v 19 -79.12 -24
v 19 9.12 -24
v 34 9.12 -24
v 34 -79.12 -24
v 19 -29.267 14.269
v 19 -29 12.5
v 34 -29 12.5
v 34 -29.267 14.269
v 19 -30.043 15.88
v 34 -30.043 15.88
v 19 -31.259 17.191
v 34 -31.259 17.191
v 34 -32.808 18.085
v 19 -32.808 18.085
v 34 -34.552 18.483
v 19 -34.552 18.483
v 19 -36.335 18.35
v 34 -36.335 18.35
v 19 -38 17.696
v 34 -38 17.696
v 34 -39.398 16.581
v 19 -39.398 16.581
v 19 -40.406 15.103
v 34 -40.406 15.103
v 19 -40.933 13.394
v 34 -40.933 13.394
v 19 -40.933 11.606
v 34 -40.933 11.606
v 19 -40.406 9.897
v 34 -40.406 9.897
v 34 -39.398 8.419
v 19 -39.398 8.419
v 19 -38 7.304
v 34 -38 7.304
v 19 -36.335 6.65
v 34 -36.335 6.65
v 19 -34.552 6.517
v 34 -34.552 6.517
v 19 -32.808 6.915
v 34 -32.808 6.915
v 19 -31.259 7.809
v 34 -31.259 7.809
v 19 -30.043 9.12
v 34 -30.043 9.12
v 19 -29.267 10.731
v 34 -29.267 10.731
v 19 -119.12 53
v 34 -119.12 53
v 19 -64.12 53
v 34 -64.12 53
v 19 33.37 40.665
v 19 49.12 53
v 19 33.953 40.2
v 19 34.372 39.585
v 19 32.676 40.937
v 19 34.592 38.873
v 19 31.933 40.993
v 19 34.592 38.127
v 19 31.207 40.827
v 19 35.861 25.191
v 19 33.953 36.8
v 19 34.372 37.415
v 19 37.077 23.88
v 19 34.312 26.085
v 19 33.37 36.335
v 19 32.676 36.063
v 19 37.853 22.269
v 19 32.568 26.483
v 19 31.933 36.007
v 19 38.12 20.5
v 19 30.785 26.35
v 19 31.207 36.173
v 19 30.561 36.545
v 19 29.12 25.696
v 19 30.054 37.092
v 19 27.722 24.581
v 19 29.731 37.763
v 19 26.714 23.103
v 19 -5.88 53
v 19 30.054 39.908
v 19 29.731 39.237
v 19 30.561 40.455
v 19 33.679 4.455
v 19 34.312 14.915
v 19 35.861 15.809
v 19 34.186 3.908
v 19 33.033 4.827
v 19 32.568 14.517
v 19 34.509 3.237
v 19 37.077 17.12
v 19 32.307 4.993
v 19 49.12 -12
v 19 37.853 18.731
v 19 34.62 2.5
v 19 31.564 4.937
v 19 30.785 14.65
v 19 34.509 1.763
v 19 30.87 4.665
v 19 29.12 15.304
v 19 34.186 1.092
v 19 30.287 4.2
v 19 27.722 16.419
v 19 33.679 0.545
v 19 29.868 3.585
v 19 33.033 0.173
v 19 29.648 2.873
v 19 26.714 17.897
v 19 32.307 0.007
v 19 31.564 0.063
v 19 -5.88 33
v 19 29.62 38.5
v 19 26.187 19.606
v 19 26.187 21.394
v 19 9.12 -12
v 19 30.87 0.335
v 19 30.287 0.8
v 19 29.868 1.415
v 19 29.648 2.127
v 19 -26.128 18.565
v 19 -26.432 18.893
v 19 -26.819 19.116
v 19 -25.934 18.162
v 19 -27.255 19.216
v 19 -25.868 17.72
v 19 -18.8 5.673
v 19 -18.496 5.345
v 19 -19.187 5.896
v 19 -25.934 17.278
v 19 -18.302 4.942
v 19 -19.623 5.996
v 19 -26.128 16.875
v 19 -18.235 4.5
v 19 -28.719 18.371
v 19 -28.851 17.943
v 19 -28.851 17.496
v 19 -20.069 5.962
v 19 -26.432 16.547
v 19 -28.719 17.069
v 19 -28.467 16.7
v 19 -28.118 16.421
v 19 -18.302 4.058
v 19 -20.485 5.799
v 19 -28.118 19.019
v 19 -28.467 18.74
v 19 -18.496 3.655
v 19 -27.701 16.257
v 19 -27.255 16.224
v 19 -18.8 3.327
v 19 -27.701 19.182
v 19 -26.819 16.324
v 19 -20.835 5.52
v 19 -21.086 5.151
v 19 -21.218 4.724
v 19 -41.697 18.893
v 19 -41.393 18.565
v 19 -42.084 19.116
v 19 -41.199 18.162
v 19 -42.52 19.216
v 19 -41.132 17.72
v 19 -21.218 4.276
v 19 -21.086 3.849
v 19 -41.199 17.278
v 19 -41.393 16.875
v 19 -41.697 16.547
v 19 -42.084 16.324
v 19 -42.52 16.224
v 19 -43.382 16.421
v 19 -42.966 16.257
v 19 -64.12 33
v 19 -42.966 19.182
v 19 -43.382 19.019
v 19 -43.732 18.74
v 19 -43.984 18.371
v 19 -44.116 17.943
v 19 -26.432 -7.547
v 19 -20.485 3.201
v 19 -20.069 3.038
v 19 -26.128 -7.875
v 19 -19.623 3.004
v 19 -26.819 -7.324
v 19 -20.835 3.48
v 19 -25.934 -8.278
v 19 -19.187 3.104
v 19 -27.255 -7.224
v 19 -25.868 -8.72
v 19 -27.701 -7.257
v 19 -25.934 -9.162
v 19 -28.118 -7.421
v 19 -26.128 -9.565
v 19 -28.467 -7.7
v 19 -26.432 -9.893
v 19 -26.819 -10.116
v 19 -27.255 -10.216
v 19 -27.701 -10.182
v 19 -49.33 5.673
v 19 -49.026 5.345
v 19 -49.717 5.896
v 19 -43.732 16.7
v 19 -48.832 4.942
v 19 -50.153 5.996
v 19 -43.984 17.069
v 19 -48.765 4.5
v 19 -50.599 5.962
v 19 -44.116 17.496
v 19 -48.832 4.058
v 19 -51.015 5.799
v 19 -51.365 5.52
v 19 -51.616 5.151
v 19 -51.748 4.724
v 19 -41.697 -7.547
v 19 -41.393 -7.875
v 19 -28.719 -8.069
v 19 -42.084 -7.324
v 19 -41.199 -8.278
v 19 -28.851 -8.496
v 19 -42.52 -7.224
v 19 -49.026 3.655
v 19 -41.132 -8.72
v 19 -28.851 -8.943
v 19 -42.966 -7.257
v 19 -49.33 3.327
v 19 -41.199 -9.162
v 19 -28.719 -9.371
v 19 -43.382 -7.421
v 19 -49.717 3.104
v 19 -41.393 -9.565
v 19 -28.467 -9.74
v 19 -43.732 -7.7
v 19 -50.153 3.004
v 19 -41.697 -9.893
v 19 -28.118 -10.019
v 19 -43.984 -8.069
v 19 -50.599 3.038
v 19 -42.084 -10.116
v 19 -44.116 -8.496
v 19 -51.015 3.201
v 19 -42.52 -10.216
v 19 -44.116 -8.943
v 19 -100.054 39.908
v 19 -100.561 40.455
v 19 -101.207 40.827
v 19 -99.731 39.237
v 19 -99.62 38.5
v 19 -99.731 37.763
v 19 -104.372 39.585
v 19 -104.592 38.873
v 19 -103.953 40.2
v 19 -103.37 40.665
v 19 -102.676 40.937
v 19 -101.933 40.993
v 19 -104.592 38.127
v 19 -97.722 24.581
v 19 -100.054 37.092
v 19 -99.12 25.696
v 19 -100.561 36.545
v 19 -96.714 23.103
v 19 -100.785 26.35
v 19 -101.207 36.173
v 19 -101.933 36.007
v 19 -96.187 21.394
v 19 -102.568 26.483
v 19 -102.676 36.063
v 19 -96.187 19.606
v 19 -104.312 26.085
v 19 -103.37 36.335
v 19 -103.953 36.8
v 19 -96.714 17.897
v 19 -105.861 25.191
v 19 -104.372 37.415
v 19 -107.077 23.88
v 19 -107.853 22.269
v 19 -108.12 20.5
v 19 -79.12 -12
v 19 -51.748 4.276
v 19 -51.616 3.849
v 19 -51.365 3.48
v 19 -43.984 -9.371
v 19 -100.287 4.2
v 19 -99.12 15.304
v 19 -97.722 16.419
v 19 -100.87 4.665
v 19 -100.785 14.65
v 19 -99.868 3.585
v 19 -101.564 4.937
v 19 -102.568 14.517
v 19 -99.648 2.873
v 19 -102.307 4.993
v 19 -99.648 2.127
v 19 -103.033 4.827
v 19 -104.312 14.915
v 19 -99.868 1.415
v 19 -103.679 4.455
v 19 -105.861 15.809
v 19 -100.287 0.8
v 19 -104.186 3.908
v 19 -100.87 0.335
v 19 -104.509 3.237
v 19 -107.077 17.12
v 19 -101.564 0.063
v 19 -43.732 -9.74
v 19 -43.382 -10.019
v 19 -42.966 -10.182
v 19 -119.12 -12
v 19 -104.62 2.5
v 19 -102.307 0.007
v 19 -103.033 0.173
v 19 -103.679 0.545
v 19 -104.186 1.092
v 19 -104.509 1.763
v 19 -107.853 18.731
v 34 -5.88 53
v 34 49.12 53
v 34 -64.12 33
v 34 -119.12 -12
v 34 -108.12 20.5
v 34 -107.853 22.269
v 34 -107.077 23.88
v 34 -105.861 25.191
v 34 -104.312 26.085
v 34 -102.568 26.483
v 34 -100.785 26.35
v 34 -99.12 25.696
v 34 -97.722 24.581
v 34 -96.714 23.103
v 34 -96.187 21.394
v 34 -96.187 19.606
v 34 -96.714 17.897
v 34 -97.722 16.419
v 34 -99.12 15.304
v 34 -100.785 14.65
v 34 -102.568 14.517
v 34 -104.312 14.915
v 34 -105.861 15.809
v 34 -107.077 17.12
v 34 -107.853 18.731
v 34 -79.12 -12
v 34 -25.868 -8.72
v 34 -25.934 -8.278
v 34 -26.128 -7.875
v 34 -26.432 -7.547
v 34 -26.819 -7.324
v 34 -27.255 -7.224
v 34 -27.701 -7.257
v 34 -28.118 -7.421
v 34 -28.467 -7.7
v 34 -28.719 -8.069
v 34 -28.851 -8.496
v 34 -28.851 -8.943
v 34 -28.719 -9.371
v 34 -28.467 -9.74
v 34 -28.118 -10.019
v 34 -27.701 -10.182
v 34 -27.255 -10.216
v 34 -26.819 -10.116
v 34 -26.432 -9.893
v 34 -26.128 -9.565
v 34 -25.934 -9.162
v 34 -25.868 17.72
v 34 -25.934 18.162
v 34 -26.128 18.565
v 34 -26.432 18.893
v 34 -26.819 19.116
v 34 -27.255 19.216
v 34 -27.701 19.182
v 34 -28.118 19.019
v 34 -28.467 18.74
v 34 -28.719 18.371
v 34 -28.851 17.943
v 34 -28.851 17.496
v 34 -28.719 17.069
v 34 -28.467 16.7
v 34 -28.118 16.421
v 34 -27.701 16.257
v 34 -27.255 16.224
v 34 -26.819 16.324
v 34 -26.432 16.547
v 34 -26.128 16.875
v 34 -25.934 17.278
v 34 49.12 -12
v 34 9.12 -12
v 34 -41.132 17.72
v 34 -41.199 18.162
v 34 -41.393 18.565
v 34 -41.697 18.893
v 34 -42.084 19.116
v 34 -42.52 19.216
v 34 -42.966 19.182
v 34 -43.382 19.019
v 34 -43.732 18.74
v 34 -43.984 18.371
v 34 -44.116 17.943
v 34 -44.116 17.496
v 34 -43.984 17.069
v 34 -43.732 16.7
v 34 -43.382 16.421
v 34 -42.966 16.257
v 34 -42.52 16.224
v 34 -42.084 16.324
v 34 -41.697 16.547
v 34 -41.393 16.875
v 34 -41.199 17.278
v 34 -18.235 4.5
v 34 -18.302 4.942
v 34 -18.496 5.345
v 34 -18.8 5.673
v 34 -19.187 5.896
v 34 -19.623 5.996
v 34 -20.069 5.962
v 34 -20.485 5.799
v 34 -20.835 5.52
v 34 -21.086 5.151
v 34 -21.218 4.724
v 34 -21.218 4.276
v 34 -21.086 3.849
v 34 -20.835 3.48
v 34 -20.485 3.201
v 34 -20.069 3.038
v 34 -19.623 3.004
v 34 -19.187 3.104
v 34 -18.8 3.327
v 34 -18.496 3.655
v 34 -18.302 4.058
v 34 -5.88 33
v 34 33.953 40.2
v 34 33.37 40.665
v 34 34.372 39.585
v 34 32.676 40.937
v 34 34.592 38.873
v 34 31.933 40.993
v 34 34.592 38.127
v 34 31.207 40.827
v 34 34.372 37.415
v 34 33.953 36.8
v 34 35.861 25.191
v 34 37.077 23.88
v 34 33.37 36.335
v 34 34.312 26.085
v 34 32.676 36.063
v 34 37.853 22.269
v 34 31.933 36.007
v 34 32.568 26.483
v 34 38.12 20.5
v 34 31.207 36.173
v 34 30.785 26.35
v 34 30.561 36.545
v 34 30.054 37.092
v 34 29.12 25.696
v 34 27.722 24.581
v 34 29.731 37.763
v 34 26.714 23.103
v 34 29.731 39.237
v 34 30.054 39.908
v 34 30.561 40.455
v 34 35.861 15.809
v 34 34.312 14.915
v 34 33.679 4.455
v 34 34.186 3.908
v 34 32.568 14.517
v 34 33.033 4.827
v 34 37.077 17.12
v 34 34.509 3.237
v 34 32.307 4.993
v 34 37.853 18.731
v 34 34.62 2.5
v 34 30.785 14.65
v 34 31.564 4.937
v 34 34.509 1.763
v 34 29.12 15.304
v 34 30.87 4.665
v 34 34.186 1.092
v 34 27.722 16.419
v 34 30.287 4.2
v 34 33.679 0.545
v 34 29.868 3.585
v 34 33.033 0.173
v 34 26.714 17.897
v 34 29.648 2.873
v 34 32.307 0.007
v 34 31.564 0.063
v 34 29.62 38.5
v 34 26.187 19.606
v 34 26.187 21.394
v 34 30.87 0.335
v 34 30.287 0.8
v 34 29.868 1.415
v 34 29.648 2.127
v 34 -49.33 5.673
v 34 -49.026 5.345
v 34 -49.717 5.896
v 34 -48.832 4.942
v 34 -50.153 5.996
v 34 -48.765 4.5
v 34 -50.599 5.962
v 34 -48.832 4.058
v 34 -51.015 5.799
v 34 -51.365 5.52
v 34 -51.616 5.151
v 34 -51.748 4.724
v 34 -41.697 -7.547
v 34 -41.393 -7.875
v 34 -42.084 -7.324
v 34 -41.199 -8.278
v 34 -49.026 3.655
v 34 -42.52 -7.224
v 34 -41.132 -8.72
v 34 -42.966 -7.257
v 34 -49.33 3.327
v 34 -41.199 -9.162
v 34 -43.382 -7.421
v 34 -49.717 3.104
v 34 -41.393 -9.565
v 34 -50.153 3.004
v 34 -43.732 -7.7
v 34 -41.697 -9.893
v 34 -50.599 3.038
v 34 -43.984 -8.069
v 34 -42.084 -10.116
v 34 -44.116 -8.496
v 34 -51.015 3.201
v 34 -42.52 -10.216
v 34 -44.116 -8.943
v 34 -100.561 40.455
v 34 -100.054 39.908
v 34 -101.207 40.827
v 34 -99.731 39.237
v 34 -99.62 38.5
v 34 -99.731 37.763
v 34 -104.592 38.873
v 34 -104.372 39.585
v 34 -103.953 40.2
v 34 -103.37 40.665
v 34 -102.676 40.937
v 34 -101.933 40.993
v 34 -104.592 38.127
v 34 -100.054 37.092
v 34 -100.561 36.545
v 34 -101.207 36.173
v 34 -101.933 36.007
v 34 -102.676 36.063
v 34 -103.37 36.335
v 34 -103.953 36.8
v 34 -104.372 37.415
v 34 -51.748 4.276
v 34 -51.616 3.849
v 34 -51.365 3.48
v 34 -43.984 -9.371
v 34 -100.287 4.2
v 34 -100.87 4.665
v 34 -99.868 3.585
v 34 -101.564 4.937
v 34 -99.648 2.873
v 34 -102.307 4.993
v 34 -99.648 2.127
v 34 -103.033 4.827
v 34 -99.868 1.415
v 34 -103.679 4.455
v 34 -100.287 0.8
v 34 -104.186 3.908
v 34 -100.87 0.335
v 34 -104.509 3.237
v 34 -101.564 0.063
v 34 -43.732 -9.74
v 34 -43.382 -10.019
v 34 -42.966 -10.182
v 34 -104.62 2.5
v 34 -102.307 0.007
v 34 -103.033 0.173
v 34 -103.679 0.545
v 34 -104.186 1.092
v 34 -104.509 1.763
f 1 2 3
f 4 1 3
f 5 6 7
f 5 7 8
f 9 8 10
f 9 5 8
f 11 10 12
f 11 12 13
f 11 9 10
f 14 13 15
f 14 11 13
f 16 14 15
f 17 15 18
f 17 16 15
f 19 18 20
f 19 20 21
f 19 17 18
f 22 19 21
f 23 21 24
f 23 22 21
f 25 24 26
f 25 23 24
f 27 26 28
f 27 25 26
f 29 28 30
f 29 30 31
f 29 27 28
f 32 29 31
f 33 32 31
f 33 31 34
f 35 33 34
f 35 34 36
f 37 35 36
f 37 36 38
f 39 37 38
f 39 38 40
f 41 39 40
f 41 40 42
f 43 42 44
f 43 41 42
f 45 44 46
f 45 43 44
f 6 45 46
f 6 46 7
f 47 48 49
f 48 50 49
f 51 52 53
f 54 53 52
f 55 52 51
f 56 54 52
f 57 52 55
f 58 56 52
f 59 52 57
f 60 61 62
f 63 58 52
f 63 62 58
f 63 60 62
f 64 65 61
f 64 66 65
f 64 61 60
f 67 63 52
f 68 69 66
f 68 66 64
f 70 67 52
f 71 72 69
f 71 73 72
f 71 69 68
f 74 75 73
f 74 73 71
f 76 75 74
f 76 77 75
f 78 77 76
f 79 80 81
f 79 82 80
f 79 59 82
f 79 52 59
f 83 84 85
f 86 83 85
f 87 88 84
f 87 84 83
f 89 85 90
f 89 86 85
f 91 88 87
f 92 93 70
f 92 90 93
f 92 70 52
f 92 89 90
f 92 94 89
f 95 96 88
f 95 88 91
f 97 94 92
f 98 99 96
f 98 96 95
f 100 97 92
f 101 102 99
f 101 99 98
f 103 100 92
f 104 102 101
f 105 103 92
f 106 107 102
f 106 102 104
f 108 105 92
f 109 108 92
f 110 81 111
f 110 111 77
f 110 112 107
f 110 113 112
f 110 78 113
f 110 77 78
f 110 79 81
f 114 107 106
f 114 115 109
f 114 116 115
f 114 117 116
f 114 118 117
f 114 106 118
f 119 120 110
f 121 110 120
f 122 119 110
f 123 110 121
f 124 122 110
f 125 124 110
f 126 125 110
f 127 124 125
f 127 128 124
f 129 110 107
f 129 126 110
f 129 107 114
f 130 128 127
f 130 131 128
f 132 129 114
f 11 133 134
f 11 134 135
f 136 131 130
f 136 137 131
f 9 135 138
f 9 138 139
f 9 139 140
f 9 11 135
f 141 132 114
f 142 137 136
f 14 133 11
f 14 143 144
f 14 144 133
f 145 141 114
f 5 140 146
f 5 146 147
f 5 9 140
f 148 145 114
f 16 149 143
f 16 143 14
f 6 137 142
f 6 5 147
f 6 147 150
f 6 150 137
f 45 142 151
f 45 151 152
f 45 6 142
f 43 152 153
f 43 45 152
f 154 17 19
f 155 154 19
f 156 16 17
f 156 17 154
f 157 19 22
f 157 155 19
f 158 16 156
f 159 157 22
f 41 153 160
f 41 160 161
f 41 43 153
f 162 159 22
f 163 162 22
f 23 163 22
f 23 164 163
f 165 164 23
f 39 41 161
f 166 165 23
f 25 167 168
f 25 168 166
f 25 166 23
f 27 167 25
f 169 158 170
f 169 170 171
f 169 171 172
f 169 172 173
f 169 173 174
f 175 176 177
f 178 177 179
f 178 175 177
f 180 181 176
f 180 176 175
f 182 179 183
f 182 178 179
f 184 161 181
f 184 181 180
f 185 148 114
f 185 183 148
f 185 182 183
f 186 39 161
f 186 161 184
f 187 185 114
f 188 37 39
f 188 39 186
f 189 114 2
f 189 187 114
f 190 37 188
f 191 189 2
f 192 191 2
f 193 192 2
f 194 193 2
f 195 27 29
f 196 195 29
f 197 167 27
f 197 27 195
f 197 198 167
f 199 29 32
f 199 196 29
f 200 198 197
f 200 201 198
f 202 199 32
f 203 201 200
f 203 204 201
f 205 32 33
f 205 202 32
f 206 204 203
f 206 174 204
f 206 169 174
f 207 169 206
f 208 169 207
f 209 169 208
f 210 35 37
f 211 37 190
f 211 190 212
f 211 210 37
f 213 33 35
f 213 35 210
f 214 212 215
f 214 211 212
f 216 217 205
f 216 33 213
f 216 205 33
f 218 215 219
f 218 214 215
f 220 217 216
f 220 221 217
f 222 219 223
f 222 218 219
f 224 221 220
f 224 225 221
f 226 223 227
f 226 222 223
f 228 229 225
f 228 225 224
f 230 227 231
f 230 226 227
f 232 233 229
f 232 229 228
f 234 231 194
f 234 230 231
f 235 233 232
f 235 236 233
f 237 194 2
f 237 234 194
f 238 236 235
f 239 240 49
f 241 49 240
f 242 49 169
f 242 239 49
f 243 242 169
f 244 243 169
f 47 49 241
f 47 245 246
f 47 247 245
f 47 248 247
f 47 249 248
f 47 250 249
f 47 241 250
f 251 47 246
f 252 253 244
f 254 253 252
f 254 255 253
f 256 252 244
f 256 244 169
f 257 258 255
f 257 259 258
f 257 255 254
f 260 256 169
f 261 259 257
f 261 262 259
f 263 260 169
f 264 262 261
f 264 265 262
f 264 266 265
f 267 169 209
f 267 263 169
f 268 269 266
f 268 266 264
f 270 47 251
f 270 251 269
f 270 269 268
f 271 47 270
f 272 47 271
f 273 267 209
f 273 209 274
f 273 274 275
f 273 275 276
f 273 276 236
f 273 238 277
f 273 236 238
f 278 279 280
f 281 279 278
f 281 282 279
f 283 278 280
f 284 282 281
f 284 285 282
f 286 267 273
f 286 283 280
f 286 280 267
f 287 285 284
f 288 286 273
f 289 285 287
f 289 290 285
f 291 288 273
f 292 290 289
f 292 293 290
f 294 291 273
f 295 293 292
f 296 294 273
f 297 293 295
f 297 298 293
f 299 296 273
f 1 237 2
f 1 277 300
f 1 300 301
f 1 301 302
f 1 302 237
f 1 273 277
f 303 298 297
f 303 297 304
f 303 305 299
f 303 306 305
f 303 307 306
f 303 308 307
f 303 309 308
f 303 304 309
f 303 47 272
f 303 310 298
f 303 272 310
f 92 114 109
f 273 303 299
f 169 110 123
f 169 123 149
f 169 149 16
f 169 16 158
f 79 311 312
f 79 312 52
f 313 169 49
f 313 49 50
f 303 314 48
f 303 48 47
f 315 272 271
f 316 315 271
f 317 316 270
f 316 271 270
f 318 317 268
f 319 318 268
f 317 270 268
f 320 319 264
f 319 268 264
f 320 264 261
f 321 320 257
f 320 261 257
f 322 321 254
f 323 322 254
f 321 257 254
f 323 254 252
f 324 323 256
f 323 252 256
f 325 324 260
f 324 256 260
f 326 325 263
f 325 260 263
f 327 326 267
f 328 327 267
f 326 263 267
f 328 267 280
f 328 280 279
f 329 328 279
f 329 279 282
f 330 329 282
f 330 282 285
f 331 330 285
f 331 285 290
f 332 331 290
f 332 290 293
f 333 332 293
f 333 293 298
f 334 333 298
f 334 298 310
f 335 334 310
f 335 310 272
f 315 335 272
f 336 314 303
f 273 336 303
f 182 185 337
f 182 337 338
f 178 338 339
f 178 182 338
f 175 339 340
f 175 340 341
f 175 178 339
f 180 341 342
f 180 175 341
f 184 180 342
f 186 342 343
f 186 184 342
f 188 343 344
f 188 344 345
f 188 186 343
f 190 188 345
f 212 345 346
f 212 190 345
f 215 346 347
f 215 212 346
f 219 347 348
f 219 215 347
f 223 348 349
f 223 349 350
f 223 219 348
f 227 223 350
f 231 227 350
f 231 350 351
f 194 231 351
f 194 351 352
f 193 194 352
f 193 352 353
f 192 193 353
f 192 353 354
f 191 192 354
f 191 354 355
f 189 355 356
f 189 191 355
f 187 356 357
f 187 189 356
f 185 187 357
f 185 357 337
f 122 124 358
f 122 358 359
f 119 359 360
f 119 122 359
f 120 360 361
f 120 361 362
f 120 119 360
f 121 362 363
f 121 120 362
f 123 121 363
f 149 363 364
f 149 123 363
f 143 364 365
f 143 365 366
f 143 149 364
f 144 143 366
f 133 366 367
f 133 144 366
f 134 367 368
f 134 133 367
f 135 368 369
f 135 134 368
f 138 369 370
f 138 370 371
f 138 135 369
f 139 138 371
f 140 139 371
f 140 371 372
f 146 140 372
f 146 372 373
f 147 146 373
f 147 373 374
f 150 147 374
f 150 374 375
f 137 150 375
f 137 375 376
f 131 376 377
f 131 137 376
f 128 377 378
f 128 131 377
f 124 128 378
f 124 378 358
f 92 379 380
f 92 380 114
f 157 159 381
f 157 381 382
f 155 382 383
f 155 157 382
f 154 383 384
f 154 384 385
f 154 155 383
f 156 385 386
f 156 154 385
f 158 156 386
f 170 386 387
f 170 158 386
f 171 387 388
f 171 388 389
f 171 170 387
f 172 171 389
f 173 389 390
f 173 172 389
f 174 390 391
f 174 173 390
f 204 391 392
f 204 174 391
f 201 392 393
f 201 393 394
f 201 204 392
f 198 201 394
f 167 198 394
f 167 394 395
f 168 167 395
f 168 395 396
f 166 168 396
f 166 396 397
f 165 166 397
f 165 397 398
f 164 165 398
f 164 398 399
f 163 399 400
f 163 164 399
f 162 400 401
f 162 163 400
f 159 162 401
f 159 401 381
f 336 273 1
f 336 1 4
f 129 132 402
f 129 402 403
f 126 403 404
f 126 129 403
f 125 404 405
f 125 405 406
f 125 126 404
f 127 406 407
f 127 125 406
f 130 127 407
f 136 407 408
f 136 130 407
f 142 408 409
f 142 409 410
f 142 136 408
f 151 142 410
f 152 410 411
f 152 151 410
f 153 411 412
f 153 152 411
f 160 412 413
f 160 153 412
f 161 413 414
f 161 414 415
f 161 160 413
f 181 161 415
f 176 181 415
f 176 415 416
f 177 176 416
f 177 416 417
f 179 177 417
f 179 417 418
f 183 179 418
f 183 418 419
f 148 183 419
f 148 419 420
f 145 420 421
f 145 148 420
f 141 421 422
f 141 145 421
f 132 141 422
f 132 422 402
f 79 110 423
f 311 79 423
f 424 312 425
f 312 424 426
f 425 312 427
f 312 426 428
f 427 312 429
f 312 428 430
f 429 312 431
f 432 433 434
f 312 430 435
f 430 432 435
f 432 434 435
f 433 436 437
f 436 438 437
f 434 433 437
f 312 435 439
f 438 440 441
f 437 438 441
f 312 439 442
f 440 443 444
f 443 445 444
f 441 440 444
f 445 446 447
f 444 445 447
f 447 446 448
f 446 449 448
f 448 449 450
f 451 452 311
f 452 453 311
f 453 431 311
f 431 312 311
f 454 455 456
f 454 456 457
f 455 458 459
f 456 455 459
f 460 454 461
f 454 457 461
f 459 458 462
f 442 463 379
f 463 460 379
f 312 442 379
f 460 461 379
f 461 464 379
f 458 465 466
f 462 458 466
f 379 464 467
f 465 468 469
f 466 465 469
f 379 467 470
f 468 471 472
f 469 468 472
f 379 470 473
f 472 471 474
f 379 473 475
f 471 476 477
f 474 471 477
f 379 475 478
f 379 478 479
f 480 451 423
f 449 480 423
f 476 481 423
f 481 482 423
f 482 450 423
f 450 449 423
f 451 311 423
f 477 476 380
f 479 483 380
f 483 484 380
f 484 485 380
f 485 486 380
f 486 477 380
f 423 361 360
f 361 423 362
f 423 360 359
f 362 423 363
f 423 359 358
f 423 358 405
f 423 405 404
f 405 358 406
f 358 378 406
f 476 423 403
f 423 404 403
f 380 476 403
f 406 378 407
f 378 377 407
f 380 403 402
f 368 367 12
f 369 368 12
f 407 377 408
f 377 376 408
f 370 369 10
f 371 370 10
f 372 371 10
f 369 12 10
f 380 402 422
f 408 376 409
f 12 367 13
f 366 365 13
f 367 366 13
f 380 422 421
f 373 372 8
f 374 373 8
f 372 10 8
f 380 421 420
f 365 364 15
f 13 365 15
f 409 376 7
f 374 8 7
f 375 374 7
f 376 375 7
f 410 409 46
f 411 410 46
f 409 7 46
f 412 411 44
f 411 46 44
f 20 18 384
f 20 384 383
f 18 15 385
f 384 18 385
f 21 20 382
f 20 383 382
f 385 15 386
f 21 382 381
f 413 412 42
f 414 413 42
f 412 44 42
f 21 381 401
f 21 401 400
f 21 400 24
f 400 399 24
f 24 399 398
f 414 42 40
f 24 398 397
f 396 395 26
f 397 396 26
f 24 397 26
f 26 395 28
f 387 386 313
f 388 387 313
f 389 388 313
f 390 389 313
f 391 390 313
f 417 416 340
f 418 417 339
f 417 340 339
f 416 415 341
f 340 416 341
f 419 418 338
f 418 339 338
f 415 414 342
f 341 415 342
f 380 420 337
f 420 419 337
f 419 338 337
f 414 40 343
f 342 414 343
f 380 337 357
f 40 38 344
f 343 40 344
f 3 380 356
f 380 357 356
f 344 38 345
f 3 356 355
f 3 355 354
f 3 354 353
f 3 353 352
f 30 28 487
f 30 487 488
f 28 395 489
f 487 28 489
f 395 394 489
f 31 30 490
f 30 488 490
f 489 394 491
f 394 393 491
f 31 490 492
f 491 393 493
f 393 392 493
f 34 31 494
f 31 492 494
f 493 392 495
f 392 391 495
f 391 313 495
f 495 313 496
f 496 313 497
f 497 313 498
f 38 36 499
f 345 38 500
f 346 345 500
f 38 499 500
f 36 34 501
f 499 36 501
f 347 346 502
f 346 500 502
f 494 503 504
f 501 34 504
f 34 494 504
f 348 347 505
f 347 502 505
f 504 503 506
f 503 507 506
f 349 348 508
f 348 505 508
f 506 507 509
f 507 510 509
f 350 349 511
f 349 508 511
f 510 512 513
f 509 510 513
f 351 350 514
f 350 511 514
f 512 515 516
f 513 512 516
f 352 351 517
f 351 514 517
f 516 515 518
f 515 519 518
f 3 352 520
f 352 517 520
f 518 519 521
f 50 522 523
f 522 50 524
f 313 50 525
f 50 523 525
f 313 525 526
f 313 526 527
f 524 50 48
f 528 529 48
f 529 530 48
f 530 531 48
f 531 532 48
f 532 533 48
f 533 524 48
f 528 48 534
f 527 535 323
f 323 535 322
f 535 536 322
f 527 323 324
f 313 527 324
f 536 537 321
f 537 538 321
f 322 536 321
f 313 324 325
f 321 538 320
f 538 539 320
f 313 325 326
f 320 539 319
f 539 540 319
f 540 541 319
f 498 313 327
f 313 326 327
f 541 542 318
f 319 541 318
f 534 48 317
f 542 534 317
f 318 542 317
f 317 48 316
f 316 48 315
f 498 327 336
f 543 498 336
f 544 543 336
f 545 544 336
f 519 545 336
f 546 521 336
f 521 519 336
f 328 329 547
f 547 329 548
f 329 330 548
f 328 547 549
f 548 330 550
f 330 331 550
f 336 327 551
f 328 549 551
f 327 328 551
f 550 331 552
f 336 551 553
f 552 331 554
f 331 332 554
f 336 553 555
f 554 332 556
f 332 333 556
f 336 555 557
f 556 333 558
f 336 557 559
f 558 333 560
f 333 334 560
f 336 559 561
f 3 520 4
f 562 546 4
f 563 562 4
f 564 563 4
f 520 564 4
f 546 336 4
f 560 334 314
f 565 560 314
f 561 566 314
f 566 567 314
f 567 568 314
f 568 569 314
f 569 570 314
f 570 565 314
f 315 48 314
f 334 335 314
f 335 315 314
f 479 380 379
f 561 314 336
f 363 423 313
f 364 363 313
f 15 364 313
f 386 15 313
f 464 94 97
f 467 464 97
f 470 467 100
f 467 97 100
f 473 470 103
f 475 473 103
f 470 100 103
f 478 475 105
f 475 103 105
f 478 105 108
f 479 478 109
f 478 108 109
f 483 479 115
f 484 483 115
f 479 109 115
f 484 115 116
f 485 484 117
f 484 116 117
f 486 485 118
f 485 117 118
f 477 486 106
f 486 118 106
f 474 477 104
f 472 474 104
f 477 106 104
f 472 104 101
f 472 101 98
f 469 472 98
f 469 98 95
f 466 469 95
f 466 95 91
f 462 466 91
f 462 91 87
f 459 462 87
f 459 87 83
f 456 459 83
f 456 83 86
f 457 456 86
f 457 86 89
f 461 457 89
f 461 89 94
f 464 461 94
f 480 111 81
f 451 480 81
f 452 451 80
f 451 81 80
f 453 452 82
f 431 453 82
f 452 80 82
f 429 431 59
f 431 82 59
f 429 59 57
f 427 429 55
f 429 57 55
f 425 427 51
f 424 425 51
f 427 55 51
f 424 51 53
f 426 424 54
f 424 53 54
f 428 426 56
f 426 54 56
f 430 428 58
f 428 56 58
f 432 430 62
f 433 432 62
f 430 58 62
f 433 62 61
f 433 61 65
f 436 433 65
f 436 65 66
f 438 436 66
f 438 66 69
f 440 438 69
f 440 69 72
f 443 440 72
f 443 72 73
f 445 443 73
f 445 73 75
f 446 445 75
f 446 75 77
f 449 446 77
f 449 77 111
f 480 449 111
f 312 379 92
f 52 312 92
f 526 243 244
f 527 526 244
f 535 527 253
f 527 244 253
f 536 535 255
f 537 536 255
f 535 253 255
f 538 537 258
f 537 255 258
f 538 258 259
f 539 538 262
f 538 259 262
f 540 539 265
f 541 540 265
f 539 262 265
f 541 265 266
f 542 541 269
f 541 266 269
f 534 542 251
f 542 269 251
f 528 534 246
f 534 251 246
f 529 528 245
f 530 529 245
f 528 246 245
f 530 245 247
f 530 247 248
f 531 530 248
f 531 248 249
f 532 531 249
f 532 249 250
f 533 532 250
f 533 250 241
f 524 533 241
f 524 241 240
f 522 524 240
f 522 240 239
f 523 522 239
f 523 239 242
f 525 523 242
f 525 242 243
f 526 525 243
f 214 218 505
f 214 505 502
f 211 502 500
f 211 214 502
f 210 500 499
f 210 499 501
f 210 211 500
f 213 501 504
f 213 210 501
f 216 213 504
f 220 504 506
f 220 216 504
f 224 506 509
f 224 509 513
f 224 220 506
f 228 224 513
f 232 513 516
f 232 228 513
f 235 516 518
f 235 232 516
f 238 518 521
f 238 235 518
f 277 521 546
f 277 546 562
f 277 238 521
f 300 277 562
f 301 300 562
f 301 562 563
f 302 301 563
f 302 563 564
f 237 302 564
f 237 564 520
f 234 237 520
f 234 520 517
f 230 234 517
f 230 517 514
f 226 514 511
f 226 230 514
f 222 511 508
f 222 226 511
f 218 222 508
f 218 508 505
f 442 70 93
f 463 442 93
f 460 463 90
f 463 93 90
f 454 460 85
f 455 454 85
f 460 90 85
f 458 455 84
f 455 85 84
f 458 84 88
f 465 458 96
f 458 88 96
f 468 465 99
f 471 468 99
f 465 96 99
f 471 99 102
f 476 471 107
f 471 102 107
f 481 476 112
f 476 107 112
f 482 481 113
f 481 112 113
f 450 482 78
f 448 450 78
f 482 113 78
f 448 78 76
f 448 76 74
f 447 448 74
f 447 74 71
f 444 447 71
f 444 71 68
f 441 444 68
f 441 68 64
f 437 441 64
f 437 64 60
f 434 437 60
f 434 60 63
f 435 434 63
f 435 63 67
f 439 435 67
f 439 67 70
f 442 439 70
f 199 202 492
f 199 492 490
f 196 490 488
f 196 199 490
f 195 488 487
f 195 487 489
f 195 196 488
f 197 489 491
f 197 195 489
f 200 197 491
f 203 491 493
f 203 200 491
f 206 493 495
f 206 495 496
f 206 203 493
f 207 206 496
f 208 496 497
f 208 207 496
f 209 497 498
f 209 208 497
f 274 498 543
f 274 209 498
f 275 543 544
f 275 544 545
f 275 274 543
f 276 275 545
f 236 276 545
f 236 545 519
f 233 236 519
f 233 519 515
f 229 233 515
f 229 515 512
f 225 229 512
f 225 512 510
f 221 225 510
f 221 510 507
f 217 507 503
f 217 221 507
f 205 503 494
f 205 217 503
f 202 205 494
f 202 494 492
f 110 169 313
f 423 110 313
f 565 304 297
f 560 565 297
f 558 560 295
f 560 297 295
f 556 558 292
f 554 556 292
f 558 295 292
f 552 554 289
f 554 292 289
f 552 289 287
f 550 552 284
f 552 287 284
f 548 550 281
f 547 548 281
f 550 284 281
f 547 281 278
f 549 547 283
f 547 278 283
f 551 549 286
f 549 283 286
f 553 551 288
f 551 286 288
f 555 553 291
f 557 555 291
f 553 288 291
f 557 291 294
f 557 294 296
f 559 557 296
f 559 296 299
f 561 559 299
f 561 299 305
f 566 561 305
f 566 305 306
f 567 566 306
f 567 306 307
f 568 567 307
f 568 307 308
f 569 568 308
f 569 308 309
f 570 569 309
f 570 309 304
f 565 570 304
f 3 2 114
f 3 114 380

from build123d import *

# Parameters (mm, degrees)
STOCK_MOUNT_START                              = 19
STOCK_MOUNT_FOR_MOTOR_IN_THE_PLATYFO_2_W       = 50
STOCK_MOUNT_FOR_MOTOR_IN_THE_PLATYFO_2_H       = 57
STOCK_MOUNT_FOR_MOTOR_IN_THE_PLATYFO_2_R       = 1.5
STOCK_MOUNT_FOR_MOTOR_IN_THE_PLATYFO_2_R_2     = 6
STOCK_MOUNT_FOR_MOTOR_IN_THE_PLATYFORM_M_DEPTH = 15
SKETCH2_W                                      = 15
SKETCH2_H                                      = 57
BOSS_EXTRUDE1_DEPTH                            = 19.12
SKETCH3_W                                      = 15
SKETCH3_H                                      = 57
BOSS_EXTRUDE2_DEPTH                            = 19.12
SKETCH4_W                                      = 15
SKETCH4_H                                      = 15
BOSS_EXTRUDE3_DEPTH                            = 20
SKETCH10_W                                     = 15
SKETCH10_H                                     = 65
BOSS_EXTRUDE6_DEPTH                            = 40
SKETCH11_R                                     = 6
SKETCH11_R_2                                   = 2.5
CUT_EXTRUDE2_DEPTH                             = 132.238616268


# Read off the part's stored shape, not the designer's step: Stock-mount for motor in the platyform mechanism-1
with BuildPart() as part:
    # Stock-mount for motor in the platyfo 2 → Stock-mount for motor in the platyform mechanism-1 (new body)
    with BuildSketch(Plane.YZ.offset(STOCK_MOUNT_START)):
        with Locations((-35, 4.5)):
            Rectangle(STOCK_MOUNT_FOR_MOTOR_IN_THE_PLATYFO_2_W, STOCK_MOUNT_FOR_MOTOR_IN_THE_PLATYFO_2_H)
        with Locations((-42.6325, -8.719877789)):
            Circle(STOCK_MOUNT_FOR_MOTOR_IN_THE_PLATYFO_2_R, mode=Mode.SUBTRACT)
        with Locations((-27.3675, -8.719877789)):
            Circle(STOCK_MOUNT_FOR_MOTOR_IN_THE_PLATYFO_2_R, mode=Mode.SUBTRACT)
        with Locations((-50.265, 4.5)):
            Circle(STOCK_MOUNT_FOR_MOTOR_IN_THE_PLATYFO_2_R, mode=Mode.SUBTRACT)
        with Locations((-42.6325, 17.719877789)):
            Circle(STOCK_MOUNT_FOR_MOTOR_IN_THE_PLATYFO_2_R, mode=Mode.SUBTRACT)
        with Locations((-35, 12.5)):
            Circle(STOCK_MOUNT_FOR_MOTOR_IN_THE_PLATYFO_2_R_2, mode=Mode.SUBTRACT)
        with Locations((-27.3675, 17.719877789)):
            Circle(STOCK_MOUNT_FOR_MOTOR_IN_THE_PLATYFO_2_R, mode=Mode.SUBTRACT)
        with Locations((-19.735, 4.5)):
            Circle(STOCK_MOUNT_FOR_MOTOR_IN_THE_PLATYFO_2_R, mode=Mode.SUBTRACT)
    extrude(amount=STOCK_MOUNT_FOR_MOTOR_IN_THE_PLATYFORM_M_DEPTH)

    # Sketch2 → Boss-Extrude1 (add)
    with BuildSketch(Plane.XZ.offset(60)):
        with Locations((26.5, 4.5)):
            Rectangle(SKETCH2_W, SKETCH2_H)
    extrude(amount=BOSS_EXTRUDE1_DEPTH)

    # Sketch3 → Boss-Extrude2 (add)
    with BuildSketch(Plane(origin=(0, -10, 0), x_dir=(1, 0, 0), z_dir=(0, 1, 0))):
        with Locations((26.5, -4.5)):
            Rectangle(SKETCH3_W, SKETCH3_H)
    extrude(amount=BOSS_EXTRUDE2_DEPTH)

    # Sketch4 → Boss-Extrude3 (add)
    with BuildSketch(Plane.XY.offset(33)):
        with Locations((26.5, 1.62)):
            Rectangle(SKETCH4_W, SKETCH4_H)
        with Locations((26.5, -71.62)):
            Rectangle(SKETCH4_W, SKETCH4_H)
    extrude(amount=BOSS_EXTRUDE3_DEPTH)

    # Sketch10 → Boss-Extrude6 (add)
    with BuildSketch(Plane(origin=(0, -79.12, 0), x_dir=(-1, 0, 0), z_dir=(0, -1, 0))):
        with Locations((-26.5, -20.5)):
            Rectangle(SKETCH10_W, SKETCH10_H)
    boss_extrude6 = extrude(amount=BOSS_EXTRUDE6_DEPTH)

    # Mirror1: Boss-Extrude6 across plane
    add(boss_extrude6.mirror(Plane.ZX.offset(-35)))

    # Sketch11 → Cut-Extrude2 (cut, through all)
    with BuildSketch(Plane.ZY.offset(-19)):
        with Locations(Location((20.5, -102.12, 0), (0, 0, 270))):
            Circle(SKETCH11_R)
        with Locations(Location((2.5, -102.12, 0), (0, 0, 270))):
            Circle(SKETCH11_R_2)
        with Locations(Location((38.5, -102.12, 0), (0, 0, 90))):
            Circle(SKETCH11_R_2)
        with Locations(Location((38.5, 32.12, 0), (0, 0, 270))):
            Circle(SKETCH11_R_2)
        with Locations(Location((20.5, 32.12, 0), (0, 0, 90))):
            Circle(SKETCH11_R)
        with Locations(Location((2.5, 32.12, 0), (0, 0, 90))):
            Circle(SKETCH11_R_2)
    extrude(amount=-CUT_EXTRUDE2_DEPTH, mode=Mode.SUBTRACT)


solid = part.part
